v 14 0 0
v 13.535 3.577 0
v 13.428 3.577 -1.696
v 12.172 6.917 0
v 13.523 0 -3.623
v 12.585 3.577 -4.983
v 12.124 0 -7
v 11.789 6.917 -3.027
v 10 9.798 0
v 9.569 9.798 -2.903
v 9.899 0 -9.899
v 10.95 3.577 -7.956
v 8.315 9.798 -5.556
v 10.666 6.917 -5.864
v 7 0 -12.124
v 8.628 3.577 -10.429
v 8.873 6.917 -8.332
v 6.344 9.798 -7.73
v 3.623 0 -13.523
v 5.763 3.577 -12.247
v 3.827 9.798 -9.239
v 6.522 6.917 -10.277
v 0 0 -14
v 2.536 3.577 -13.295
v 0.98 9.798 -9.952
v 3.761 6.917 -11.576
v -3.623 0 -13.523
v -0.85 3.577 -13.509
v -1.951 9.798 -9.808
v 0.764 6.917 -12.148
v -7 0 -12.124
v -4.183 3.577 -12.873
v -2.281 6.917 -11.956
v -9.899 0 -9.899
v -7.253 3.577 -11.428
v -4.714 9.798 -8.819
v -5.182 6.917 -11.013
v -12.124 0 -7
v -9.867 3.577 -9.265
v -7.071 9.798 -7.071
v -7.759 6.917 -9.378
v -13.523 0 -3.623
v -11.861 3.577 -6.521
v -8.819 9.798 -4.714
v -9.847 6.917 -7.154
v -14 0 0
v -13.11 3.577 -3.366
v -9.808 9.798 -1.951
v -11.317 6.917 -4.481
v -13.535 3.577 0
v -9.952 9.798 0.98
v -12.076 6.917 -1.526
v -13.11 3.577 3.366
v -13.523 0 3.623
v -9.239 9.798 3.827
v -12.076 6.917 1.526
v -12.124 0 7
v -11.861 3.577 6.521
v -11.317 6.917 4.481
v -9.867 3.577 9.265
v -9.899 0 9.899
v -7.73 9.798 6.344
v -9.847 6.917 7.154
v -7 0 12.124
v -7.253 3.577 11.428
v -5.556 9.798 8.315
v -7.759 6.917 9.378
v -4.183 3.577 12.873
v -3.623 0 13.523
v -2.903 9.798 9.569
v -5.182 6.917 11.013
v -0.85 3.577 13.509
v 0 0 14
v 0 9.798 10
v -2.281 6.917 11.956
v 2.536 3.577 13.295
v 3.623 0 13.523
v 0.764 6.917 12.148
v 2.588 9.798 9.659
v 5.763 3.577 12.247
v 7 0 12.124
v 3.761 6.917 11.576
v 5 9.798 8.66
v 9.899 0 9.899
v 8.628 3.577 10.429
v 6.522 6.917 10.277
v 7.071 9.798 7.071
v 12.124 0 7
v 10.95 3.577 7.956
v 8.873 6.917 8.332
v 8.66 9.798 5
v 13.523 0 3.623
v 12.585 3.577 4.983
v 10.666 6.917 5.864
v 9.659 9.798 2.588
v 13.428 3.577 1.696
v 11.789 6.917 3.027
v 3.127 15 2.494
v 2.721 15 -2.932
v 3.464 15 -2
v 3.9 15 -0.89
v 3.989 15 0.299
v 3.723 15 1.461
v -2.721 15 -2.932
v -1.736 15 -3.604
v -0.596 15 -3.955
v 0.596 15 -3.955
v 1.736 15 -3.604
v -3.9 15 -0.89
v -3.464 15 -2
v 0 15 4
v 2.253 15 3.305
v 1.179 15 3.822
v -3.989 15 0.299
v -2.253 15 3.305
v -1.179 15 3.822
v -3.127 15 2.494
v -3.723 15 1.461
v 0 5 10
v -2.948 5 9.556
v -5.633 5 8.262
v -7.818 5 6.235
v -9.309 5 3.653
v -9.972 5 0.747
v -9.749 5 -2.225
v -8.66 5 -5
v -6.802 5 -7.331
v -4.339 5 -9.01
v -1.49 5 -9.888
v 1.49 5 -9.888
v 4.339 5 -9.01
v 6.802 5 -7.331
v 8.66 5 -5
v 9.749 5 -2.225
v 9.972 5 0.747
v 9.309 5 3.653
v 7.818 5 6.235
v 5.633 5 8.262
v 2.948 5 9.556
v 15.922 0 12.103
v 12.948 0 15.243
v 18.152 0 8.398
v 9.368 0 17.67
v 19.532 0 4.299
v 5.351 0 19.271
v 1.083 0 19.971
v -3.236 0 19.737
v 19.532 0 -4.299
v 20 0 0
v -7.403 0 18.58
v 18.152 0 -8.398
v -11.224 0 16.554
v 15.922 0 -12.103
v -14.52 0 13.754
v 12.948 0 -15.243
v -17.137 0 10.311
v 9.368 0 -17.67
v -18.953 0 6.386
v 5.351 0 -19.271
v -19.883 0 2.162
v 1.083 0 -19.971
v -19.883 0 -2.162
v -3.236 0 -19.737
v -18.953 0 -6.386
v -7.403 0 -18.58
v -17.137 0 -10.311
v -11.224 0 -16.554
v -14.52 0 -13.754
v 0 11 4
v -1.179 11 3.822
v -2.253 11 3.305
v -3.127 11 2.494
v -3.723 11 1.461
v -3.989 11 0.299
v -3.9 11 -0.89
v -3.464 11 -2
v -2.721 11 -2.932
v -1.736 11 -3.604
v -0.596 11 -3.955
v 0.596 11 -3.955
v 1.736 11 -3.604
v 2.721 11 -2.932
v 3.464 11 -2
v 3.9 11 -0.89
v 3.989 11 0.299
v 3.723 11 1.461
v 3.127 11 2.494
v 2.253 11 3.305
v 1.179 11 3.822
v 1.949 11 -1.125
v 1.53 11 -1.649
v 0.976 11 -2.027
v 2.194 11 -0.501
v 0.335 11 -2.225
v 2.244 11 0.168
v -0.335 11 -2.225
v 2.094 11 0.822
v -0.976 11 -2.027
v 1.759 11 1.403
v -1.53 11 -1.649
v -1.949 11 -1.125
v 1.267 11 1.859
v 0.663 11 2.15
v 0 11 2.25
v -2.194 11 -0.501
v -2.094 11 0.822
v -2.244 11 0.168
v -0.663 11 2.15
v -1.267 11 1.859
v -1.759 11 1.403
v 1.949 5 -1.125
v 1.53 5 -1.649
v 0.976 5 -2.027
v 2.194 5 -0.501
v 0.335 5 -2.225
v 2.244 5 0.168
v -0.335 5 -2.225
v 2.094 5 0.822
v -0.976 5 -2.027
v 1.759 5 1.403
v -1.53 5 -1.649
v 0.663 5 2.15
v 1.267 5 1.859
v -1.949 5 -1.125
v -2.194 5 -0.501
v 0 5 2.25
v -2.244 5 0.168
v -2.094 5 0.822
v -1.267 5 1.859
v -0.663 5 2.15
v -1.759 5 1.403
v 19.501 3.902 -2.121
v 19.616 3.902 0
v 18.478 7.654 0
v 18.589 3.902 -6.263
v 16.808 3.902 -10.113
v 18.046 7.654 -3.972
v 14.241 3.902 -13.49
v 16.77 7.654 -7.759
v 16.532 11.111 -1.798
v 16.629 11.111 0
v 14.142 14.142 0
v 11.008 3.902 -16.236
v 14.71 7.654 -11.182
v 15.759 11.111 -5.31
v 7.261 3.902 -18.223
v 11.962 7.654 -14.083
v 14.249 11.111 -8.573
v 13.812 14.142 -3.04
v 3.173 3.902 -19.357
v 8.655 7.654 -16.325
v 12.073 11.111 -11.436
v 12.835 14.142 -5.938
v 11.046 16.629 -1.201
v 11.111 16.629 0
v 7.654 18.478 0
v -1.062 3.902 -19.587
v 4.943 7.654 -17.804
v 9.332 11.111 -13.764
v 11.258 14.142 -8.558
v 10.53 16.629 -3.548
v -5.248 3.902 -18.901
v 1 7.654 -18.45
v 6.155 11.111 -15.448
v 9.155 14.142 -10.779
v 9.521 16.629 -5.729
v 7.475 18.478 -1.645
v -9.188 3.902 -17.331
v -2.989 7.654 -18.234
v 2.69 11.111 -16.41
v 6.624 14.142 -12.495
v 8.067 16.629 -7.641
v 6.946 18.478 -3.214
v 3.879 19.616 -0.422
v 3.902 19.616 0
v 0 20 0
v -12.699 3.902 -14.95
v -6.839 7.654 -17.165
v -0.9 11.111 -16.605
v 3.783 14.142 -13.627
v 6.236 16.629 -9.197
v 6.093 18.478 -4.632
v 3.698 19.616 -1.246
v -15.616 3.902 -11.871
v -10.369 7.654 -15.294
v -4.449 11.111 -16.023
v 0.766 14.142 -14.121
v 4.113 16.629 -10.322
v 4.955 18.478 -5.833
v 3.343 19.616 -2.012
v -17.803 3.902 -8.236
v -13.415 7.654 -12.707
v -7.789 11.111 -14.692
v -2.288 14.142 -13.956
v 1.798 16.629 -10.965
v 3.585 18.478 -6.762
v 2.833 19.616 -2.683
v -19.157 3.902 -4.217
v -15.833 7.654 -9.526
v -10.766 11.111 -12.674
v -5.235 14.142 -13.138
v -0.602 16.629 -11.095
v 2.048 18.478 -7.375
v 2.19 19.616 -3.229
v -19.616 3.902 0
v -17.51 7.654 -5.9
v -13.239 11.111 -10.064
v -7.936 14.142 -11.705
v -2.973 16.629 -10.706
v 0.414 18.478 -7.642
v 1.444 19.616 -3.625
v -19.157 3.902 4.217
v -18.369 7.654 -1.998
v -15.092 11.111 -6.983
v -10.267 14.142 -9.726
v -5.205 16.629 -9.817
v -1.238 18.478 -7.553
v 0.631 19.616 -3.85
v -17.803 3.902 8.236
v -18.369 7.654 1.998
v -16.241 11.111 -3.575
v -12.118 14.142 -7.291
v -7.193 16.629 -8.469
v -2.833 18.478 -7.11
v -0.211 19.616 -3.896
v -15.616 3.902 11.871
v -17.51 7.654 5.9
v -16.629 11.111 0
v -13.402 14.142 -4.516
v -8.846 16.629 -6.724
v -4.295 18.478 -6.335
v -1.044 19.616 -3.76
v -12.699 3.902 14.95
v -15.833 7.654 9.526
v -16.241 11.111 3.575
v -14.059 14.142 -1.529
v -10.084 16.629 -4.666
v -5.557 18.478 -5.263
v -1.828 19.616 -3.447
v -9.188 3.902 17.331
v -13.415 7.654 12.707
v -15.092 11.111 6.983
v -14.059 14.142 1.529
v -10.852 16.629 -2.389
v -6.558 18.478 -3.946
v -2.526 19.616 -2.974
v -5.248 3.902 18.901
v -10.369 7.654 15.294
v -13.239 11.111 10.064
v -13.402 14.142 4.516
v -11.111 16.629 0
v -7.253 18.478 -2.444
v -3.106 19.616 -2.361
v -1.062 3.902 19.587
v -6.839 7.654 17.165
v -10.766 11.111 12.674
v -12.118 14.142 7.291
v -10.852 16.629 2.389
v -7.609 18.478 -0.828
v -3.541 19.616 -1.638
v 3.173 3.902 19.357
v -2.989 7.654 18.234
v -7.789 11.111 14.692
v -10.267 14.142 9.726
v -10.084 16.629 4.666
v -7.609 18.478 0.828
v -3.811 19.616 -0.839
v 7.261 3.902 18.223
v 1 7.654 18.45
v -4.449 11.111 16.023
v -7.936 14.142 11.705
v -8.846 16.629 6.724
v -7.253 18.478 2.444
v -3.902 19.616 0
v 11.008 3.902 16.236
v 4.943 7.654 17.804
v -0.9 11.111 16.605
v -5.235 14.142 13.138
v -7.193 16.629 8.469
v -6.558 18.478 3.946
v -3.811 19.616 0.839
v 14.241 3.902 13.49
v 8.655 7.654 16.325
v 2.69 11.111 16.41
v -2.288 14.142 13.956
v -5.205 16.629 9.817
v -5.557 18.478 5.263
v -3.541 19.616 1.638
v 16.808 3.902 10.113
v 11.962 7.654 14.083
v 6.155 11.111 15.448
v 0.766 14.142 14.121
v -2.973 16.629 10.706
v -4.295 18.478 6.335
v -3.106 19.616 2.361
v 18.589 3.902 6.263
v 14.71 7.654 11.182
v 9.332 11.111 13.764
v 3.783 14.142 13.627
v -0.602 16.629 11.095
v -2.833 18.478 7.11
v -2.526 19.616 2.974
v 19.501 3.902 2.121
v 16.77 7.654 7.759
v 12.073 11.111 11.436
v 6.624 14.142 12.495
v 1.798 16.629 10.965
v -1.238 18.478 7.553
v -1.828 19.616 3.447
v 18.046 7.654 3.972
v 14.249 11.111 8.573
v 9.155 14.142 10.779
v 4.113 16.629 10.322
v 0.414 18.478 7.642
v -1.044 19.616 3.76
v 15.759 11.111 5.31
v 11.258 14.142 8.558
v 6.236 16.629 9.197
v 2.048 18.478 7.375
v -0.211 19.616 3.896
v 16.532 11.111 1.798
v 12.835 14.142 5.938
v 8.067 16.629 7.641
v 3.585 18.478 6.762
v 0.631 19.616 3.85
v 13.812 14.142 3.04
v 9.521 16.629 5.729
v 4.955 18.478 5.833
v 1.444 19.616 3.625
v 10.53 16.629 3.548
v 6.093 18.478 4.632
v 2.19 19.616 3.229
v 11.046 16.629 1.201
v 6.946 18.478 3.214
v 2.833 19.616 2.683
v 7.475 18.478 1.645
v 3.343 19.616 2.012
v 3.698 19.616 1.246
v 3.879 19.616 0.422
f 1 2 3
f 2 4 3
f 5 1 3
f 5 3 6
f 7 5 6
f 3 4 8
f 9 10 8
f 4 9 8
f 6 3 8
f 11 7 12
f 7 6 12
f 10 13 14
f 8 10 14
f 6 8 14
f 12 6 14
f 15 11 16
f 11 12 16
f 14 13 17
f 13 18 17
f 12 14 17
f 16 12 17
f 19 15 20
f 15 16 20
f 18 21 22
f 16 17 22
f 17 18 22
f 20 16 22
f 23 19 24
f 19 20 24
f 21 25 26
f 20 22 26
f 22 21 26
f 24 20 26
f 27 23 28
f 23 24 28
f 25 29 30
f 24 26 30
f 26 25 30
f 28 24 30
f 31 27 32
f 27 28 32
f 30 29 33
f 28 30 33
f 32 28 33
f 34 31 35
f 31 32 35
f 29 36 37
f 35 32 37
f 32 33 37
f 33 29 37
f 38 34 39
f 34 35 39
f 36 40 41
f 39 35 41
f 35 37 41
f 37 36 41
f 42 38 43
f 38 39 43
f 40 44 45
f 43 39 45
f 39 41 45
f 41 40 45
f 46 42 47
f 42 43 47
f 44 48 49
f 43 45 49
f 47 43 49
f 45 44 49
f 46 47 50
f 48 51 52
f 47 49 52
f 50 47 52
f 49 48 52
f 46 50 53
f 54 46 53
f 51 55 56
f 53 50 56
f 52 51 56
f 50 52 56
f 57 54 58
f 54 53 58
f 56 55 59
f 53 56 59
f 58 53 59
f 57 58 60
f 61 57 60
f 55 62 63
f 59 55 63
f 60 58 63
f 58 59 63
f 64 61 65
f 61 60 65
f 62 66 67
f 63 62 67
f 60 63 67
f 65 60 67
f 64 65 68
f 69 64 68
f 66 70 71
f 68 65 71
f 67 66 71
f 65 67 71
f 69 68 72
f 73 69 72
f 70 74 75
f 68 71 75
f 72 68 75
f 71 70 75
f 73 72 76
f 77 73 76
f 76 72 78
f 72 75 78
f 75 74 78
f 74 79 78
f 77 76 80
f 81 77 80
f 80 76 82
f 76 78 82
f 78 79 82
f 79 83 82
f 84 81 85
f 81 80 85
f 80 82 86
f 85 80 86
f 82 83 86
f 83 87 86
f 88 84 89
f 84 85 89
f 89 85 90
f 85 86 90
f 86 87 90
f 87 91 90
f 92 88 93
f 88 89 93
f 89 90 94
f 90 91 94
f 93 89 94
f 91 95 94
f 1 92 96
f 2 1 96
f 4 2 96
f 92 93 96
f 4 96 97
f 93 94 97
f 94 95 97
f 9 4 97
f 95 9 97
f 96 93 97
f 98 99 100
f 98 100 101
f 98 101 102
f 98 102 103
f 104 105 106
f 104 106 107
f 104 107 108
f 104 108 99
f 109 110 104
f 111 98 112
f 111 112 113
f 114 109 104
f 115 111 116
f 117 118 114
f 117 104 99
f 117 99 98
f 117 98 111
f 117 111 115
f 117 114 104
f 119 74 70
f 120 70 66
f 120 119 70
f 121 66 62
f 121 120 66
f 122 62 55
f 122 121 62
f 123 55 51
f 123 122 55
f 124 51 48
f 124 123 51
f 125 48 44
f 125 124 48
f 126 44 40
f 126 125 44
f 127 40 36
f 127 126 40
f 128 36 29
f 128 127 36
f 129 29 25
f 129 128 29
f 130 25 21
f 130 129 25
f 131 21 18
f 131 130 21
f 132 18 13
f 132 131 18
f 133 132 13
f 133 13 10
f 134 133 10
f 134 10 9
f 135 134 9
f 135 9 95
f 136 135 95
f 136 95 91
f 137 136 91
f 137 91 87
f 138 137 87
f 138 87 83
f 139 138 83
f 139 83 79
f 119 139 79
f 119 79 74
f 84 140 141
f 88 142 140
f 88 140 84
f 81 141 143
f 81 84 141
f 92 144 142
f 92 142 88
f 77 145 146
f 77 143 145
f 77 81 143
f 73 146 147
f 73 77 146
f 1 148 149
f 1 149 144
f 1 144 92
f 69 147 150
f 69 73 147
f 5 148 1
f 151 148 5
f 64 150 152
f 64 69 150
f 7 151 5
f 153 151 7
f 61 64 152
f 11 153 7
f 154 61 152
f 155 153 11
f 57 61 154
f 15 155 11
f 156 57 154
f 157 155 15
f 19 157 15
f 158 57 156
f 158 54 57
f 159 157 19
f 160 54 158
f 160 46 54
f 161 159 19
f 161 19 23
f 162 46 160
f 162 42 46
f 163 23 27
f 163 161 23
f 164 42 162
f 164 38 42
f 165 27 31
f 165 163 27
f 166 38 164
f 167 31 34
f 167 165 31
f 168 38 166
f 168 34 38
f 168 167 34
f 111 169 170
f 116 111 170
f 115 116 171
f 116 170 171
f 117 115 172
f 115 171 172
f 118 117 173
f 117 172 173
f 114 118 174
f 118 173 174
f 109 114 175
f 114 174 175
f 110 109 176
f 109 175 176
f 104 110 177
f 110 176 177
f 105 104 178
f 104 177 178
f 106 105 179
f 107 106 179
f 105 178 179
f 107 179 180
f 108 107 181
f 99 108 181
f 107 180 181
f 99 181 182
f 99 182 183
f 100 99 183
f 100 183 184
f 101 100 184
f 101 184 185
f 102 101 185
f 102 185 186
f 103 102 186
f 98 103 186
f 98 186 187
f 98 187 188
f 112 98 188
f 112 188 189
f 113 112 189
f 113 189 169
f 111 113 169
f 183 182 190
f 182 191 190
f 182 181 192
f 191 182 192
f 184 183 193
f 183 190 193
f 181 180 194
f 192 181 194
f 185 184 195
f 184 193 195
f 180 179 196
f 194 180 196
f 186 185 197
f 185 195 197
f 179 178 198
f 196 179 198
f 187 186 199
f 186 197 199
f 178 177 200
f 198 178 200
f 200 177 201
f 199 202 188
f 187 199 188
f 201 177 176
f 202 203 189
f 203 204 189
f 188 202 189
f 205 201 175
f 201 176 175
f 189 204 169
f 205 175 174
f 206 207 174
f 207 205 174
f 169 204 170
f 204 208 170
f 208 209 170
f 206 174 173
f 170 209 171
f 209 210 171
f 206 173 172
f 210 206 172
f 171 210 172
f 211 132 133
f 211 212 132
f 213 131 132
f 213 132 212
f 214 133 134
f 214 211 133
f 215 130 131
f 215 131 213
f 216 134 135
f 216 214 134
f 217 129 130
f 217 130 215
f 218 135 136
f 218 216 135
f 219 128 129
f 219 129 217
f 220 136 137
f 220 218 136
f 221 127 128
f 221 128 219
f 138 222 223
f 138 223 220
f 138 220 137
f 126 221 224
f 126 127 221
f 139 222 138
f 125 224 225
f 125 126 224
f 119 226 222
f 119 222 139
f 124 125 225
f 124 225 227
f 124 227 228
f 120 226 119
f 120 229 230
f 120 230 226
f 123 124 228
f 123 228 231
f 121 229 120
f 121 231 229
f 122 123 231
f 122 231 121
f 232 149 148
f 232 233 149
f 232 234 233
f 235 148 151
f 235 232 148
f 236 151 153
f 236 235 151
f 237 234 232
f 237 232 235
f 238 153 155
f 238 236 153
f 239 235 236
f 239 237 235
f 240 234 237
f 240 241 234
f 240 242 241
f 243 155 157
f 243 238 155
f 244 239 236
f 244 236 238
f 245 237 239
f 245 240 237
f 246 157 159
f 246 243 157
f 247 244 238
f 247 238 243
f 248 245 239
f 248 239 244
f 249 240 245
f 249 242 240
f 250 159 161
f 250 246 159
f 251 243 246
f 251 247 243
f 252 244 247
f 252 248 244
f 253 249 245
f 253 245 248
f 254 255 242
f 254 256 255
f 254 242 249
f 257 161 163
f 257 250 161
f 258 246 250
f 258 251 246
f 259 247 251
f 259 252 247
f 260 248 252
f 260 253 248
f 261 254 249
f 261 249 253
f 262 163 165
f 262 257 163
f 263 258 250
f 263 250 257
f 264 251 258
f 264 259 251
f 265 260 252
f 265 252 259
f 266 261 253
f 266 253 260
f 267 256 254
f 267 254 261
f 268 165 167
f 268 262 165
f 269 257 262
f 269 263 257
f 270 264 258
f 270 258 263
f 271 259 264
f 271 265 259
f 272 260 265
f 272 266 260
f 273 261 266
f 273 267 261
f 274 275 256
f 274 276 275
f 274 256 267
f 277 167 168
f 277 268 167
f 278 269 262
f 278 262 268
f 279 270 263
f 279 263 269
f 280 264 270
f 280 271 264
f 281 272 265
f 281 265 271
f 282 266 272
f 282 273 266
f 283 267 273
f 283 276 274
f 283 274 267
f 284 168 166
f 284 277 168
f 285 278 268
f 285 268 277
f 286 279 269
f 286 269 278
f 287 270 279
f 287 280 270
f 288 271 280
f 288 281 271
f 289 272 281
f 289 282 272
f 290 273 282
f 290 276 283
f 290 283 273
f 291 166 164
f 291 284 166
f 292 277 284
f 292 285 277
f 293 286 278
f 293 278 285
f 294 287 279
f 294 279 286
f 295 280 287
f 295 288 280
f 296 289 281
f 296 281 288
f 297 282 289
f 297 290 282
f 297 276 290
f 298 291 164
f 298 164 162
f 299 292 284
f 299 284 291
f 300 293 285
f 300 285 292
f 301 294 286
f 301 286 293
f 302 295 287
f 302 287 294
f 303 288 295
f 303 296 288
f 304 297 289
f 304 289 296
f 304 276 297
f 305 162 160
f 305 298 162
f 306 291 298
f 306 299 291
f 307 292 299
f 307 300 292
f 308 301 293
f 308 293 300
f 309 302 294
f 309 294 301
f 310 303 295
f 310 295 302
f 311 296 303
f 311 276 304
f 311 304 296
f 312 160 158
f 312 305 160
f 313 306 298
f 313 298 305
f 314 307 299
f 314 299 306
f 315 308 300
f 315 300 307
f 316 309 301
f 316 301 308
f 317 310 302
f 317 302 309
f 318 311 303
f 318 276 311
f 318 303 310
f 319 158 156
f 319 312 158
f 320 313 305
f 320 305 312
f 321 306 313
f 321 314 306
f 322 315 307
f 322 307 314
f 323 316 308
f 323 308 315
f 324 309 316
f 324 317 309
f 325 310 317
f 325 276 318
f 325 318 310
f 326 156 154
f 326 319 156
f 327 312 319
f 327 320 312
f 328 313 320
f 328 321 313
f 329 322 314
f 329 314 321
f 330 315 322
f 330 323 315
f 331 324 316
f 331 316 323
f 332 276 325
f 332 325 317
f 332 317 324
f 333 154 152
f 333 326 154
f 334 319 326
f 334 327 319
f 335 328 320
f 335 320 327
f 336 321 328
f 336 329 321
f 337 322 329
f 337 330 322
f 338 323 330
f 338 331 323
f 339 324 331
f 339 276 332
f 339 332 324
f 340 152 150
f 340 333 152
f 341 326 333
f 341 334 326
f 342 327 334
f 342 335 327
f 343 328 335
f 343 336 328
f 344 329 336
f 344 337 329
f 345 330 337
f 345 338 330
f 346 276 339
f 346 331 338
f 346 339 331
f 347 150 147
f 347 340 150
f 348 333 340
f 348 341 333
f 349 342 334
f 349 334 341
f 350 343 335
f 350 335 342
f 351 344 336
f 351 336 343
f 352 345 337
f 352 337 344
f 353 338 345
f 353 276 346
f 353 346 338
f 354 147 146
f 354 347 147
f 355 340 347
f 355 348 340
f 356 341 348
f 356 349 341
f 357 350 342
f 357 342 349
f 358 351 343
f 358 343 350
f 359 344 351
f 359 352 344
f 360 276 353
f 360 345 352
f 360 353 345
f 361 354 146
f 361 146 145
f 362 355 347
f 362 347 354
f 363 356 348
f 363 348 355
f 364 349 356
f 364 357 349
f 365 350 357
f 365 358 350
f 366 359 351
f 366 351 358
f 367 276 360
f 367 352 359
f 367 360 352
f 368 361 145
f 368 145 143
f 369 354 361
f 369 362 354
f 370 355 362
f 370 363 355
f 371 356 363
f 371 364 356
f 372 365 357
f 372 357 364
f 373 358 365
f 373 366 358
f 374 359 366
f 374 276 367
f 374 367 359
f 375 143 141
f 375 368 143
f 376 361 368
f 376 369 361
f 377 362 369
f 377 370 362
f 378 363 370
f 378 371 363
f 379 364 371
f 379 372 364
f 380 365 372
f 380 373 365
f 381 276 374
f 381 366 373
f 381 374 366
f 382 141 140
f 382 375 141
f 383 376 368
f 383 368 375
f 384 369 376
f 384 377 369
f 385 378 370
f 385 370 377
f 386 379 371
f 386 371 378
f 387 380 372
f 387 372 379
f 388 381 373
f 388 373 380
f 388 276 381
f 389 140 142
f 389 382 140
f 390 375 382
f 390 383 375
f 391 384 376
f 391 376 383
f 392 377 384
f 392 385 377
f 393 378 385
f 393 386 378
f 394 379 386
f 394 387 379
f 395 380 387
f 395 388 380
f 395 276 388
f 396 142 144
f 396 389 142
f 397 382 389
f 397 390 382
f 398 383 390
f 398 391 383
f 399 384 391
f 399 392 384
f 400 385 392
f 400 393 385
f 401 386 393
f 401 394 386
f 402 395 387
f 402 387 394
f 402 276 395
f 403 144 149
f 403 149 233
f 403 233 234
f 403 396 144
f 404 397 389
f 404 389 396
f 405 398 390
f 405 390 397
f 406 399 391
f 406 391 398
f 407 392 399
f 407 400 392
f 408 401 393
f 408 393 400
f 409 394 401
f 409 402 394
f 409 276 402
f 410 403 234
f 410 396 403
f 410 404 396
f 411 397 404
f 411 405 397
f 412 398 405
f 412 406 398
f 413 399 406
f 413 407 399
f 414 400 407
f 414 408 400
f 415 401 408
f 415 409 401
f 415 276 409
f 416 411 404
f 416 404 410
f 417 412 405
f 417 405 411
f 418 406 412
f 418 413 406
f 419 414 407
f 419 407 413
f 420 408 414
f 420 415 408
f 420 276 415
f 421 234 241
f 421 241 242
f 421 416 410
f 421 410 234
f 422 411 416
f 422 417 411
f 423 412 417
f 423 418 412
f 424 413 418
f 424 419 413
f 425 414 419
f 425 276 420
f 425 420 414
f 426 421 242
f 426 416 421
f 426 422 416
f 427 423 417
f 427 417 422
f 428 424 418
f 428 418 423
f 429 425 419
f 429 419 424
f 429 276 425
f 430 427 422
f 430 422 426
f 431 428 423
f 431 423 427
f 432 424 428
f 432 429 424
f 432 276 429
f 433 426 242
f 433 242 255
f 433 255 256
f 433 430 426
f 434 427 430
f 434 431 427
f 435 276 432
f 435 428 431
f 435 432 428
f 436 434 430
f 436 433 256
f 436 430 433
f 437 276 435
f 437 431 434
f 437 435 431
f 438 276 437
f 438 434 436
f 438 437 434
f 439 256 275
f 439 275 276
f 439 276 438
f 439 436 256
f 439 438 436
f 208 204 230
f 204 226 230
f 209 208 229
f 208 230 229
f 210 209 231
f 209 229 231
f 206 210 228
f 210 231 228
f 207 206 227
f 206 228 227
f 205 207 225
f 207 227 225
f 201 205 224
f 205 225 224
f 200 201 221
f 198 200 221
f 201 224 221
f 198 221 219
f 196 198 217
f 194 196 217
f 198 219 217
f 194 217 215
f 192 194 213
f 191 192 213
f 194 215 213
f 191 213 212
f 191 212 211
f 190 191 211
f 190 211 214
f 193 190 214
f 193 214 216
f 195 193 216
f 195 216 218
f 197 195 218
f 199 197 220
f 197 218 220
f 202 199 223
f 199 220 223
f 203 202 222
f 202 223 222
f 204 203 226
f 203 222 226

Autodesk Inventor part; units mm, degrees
ref_plane "YZ Plane" through (0, 0, 0) normal (1, 0, 0) x (0, 1, 0)
ref_plane "XY Plane" through (0, 0, 0) normal (0, 0, 1) x (1, 0, 0)
sketch "Sketch1" plane through (0, 0, 0) normal (0, 0, 1) x (1, 0, 0)
  line L0 (0, 0) -> (0, 20)
  line L1 (0, 0) -> (20, 0)
  arc A0 (20, 0) -> (0, 20) centre (0, 0) ccw
  line L2 (0, -4.8284) -> (0, 28.9706) projected
  dimension "d2" = 20
revolve "Revolution1" add sketch "Sketch1" angle 360 about axis through (0, -10, 0) along (0, 1, 0)
ref_plane "Work Plane1" through (0, 15, 0) normal (0, 1, 0) x (-1, 0, 0)
sketch "Sketch2" plane through (0, 15, 0) normal (0, 1, 0) x (-1, 0, 0)
  point P0 (0, 0)
  point P1 (0, 0)
hole "Hole1" at (0, 15, 0) direction (0, -1, 0) diameter 4.5 end through all counterbore diameter 8 counterbore depth 4 clearance for "Socket Head Cap Screw" size "M4" standard "Ansi Metric M Profile"
shell "Shell1" thickness 6 removed faces 1 at (13.8841, 0, 1.6858)
sketch "Sketch3" plane through (0, 0, 0) normal (0, -1, 0) x (1, 0, 0)
  circle A0 centre (0, 0) radius 8.25 projected
  circle A1 centre (0, 0) radius 2.25 projected
extrude "Extrusion1" cut sketch "Sketch3" against normal blind 5
properties part number "Ball_Upper Half" material "Nylon 6/6"
